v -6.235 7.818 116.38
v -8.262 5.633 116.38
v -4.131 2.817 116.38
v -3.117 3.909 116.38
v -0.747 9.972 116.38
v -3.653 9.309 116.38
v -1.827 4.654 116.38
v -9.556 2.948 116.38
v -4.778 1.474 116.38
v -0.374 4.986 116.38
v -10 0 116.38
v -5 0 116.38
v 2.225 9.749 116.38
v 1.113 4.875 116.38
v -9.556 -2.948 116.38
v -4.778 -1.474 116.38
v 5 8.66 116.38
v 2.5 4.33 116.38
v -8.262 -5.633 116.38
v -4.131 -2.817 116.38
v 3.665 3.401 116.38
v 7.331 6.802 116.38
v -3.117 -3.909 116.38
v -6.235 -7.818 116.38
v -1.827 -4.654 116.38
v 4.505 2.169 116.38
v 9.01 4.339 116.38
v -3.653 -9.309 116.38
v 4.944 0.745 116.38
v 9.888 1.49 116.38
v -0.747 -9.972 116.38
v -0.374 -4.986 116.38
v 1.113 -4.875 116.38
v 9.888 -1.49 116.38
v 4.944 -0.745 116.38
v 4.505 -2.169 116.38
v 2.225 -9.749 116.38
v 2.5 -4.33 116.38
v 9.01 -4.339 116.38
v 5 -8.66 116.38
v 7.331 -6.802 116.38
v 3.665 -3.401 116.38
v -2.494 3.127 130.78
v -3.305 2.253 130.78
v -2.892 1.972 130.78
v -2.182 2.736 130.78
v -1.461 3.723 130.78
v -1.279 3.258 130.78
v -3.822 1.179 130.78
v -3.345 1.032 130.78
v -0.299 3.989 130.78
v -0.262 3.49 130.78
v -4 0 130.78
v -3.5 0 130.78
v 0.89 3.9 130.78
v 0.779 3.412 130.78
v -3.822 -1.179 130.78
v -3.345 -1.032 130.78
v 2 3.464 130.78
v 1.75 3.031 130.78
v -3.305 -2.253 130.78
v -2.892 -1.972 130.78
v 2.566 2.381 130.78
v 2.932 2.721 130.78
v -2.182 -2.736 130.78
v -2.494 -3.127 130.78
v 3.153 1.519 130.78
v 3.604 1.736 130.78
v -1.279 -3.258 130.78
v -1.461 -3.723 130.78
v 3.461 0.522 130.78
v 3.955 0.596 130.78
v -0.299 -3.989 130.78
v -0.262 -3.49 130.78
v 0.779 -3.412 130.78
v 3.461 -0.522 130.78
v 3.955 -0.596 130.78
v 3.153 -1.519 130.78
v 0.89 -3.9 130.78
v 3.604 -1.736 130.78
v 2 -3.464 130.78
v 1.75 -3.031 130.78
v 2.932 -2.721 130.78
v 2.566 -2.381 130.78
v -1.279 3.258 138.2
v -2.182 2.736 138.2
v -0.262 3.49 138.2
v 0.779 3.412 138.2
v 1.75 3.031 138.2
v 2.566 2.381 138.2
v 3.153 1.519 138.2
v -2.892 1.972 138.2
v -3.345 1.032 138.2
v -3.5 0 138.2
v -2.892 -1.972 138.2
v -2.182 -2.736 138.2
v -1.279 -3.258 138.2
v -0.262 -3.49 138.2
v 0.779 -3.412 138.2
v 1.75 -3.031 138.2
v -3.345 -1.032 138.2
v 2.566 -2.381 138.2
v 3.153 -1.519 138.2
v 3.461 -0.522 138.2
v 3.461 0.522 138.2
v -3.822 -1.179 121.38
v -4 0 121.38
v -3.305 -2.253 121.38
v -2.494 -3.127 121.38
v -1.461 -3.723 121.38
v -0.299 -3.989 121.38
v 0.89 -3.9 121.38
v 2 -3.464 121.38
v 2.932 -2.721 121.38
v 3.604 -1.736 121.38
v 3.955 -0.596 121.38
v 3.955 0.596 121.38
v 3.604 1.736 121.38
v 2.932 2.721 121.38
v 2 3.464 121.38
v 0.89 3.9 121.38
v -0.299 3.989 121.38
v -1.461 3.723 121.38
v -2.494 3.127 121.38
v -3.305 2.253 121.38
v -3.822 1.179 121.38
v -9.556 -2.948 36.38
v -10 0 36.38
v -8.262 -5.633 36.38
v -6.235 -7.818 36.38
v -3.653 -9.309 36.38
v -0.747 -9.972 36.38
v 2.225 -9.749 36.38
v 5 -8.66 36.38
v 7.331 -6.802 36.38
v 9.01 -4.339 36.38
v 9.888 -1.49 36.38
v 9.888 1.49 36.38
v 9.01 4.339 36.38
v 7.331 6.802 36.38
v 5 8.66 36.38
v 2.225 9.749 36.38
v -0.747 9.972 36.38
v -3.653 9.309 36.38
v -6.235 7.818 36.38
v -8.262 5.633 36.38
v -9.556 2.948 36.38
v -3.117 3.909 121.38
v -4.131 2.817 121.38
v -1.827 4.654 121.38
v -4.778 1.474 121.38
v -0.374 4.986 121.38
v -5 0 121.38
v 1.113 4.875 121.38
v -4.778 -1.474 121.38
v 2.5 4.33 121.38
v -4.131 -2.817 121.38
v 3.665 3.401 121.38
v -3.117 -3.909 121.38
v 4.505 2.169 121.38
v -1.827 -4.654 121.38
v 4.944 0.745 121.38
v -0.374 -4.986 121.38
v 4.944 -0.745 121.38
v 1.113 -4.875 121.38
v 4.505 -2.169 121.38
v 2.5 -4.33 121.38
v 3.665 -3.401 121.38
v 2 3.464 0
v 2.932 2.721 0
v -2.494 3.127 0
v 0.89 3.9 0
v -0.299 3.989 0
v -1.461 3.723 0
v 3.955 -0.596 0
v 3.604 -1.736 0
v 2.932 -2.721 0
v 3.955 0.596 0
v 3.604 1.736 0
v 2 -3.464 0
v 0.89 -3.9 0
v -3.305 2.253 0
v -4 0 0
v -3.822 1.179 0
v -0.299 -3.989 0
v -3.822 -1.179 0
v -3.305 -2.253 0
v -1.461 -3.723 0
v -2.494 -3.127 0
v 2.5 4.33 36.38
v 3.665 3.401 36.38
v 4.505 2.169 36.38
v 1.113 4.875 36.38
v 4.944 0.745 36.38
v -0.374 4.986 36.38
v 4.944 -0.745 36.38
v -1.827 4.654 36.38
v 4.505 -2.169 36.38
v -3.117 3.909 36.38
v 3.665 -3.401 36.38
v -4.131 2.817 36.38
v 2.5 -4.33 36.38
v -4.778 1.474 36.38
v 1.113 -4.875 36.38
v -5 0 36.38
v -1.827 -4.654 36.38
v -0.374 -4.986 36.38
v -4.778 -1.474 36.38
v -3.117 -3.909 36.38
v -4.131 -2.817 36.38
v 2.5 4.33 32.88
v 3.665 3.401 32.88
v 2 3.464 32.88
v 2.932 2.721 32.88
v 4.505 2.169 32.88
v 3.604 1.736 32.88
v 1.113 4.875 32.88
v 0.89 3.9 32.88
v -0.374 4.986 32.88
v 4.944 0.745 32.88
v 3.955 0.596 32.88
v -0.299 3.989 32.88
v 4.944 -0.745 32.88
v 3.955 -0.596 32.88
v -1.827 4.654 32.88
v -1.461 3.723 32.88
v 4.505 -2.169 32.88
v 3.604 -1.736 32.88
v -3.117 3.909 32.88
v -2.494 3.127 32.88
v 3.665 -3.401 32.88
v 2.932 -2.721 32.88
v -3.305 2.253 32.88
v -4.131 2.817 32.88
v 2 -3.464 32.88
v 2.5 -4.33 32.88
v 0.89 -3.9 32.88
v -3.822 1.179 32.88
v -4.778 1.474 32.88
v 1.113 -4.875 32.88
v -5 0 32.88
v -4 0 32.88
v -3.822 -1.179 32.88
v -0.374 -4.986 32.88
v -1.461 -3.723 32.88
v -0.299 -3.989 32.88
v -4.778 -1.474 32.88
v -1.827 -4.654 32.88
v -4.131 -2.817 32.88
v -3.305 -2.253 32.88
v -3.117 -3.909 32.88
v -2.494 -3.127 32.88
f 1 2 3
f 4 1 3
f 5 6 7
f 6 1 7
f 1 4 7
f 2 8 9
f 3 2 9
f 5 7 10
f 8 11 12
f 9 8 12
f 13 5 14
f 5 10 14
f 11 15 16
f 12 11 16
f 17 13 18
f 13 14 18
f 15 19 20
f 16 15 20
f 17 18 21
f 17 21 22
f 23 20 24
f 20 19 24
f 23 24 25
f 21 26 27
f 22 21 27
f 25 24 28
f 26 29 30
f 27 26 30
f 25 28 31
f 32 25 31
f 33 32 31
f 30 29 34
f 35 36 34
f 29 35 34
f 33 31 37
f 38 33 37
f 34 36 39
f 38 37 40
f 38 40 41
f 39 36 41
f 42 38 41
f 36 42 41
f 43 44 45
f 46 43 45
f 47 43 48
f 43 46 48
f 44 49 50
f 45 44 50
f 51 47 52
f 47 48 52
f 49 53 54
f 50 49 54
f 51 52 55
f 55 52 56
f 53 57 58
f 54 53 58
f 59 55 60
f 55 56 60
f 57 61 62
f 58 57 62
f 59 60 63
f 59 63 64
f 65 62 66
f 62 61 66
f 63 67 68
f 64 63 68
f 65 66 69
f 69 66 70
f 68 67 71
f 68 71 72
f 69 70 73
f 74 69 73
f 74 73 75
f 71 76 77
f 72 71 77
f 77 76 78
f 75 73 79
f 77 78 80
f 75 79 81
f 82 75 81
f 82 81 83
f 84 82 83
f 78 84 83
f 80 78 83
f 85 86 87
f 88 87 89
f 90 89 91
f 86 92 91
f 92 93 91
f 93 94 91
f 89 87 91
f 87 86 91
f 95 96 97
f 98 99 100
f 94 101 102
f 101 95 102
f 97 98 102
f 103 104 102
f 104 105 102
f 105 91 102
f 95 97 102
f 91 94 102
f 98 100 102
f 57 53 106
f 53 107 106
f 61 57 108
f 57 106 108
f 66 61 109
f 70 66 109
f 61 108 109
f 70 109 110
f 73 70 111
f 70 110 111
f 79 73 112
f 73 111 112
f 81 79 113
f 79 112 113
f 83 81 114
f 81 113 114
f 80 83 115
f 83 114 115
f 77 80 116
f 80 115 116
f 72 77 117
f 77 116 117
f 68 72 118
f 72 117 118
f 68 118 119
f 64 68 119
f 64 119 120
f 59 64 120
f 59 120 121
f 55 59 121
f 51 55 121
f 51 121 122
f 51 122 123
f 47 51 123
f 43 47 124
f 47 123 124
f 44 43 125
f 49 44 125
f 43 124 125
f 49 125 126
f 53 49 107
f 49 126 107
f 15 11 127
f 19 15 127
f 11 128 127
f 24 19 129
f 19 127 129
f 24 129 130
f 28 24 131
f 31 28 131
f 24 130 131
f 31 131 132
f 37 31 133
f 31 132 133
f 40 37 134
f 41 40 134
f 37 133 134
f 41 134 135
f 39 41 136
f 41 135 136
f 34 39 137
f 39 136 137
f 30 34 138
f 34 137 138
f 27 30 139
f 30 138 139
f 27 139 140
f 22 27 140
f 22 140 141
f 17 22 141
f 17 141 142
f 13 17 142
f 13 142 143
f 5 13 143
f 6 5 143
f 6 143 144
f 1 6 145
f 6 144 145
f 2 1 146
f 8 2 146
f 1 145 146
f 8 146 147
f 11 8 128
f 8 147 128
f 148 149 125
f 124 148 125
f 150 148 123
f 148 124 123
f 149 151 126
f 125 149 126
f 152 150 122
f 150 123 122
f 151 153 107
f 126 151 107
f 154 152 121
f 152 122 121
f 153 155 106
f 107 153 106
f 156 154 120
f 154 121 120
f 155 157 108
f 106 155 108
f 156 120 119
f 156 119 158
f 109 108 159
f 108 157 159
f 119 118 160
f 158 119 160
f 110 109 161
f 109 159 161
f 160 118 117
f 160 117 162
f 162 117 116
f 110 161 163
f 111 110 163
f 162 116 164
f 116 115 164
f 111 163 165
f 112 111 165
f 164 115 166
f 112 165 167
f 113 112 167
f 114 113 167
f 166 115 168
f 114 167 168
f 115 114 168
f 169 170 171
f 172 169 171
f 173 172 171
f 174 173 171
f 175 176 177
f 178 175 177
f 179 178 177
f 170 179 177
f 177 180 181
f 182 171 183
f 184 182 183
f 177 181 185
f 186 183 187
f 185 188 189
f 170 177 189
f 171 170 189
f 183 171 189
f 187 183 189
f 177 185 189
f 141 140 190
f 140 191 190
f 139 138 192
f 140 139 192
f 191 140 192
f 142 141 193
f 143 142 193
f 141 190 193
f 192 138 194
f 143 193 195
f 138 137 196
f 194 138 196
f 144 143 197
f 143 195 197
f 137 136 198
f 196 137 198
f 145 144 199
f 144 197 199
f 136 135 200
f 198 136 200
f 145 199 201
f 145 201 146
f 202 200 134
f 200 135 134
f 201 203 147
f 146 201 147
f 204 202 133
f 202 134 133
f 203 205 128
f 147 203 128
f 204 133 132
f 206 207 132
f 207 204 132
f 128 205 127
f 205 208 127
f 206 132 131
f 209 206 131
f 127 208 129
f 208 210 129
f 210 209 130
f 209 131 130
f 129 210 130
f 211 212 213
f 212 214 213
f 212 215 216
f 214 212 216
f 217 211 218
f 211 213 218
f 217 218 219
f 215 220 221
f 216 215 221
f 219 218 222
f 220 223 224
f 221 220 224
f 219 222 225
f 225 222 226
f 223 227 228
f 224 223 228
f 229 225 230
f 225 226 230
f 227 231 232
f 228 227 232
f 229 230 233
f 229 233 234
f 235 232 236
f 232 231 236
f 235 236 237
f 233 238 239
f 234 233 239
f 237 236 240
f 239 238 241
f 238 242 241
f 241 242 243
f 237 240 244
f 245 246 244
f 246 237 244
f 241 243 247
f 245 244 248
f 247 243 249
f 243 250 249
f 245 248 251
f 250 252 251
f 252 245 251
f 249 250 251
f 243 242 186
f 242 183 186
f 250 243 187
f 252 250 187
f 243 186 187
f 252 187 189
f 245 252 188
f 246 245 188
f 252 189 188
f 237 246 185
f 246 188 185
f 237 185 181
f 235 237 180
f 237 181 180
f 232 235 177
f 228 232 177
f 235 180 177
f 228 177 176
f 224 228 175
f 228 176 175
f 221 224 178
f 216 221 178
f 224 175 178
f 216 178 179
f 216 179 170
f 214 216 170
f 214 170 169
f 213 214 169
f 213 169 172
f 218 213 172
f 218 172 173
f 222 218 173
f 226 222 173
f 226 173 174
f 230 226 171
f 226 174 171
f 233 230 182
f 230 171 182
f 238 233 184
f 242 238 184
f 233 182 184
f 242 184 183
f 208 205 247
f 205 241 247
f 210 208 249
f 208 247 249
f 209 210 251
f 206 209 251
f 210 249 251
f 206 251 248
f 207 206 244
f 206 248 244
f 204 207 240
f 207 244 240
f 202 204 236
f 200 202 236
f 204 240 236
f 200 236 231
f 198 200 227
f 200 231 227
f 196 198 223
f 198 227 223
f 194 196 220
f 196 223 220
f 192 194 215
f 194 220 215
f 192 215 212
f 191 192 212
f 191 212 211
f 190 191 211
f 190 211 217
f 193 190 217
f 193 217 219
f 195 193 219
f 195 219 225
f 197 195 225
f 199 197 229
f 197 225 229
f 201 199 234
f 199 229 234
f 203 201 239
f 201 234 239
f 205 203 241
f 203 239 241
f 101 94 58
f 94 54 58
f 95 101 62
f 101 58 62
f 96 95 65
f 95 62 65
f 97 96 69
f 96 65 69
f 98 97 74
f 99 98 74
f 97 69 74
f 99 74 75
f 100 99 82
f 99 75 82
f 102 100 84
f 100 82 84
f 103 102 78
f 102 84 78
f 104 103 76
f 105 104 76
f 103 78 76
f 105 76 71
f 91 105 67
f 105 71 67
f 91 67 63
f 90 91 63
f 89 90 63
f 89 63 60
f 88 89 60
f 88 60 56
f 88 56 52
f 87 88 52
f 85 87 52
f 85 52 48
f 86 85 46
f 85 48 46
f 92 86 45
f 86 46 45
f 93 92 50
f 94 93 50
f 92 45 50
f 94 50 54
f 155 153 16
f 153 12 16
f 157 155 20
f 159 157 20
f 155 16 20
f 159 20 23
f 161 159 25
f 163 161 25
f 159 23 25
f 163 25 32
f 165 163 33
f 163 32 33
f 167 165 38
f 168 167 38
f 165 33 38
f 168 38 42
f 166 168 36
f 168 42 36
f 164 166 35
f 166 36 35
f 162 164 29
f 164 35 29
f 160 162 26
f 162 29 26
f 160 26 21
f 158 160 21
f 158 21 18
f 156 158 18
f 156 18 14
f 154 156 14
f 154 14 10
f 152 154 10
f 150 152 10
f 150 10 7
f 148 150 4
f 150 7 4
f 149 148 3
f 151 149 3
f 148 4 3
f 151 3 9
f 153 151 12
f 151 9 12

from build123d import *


with BuildPart() as part:
    # Çizim1 → Döndür1 (revolve)
    with BuildSketch(Plane(origin=(0, 0, 0), x_dir=(1, 0, 0), z_dir=(0, 1, 0)), mode=Mode.PRIVATE) as d_nd_r1_sk:
        Polygon((0, 0), (0, -138.2), (3.5, -138.2), (3.5, -130.78), (4, -130.78), (4, -121.38), (5, -121.38), (5, -116.38), (10, -116.38), (10, -36.38), (5, -36.38), (5, -32.88), (4, -32.88), (4, 0), align=None)
    revolve(d_nd_r1_sk.sketch.rotate(Axis((0, 0, 0), (0, 0, 1)), 180), axis=Axis((0, 0, 0), (0, 0, 1)))


solid = part.part
